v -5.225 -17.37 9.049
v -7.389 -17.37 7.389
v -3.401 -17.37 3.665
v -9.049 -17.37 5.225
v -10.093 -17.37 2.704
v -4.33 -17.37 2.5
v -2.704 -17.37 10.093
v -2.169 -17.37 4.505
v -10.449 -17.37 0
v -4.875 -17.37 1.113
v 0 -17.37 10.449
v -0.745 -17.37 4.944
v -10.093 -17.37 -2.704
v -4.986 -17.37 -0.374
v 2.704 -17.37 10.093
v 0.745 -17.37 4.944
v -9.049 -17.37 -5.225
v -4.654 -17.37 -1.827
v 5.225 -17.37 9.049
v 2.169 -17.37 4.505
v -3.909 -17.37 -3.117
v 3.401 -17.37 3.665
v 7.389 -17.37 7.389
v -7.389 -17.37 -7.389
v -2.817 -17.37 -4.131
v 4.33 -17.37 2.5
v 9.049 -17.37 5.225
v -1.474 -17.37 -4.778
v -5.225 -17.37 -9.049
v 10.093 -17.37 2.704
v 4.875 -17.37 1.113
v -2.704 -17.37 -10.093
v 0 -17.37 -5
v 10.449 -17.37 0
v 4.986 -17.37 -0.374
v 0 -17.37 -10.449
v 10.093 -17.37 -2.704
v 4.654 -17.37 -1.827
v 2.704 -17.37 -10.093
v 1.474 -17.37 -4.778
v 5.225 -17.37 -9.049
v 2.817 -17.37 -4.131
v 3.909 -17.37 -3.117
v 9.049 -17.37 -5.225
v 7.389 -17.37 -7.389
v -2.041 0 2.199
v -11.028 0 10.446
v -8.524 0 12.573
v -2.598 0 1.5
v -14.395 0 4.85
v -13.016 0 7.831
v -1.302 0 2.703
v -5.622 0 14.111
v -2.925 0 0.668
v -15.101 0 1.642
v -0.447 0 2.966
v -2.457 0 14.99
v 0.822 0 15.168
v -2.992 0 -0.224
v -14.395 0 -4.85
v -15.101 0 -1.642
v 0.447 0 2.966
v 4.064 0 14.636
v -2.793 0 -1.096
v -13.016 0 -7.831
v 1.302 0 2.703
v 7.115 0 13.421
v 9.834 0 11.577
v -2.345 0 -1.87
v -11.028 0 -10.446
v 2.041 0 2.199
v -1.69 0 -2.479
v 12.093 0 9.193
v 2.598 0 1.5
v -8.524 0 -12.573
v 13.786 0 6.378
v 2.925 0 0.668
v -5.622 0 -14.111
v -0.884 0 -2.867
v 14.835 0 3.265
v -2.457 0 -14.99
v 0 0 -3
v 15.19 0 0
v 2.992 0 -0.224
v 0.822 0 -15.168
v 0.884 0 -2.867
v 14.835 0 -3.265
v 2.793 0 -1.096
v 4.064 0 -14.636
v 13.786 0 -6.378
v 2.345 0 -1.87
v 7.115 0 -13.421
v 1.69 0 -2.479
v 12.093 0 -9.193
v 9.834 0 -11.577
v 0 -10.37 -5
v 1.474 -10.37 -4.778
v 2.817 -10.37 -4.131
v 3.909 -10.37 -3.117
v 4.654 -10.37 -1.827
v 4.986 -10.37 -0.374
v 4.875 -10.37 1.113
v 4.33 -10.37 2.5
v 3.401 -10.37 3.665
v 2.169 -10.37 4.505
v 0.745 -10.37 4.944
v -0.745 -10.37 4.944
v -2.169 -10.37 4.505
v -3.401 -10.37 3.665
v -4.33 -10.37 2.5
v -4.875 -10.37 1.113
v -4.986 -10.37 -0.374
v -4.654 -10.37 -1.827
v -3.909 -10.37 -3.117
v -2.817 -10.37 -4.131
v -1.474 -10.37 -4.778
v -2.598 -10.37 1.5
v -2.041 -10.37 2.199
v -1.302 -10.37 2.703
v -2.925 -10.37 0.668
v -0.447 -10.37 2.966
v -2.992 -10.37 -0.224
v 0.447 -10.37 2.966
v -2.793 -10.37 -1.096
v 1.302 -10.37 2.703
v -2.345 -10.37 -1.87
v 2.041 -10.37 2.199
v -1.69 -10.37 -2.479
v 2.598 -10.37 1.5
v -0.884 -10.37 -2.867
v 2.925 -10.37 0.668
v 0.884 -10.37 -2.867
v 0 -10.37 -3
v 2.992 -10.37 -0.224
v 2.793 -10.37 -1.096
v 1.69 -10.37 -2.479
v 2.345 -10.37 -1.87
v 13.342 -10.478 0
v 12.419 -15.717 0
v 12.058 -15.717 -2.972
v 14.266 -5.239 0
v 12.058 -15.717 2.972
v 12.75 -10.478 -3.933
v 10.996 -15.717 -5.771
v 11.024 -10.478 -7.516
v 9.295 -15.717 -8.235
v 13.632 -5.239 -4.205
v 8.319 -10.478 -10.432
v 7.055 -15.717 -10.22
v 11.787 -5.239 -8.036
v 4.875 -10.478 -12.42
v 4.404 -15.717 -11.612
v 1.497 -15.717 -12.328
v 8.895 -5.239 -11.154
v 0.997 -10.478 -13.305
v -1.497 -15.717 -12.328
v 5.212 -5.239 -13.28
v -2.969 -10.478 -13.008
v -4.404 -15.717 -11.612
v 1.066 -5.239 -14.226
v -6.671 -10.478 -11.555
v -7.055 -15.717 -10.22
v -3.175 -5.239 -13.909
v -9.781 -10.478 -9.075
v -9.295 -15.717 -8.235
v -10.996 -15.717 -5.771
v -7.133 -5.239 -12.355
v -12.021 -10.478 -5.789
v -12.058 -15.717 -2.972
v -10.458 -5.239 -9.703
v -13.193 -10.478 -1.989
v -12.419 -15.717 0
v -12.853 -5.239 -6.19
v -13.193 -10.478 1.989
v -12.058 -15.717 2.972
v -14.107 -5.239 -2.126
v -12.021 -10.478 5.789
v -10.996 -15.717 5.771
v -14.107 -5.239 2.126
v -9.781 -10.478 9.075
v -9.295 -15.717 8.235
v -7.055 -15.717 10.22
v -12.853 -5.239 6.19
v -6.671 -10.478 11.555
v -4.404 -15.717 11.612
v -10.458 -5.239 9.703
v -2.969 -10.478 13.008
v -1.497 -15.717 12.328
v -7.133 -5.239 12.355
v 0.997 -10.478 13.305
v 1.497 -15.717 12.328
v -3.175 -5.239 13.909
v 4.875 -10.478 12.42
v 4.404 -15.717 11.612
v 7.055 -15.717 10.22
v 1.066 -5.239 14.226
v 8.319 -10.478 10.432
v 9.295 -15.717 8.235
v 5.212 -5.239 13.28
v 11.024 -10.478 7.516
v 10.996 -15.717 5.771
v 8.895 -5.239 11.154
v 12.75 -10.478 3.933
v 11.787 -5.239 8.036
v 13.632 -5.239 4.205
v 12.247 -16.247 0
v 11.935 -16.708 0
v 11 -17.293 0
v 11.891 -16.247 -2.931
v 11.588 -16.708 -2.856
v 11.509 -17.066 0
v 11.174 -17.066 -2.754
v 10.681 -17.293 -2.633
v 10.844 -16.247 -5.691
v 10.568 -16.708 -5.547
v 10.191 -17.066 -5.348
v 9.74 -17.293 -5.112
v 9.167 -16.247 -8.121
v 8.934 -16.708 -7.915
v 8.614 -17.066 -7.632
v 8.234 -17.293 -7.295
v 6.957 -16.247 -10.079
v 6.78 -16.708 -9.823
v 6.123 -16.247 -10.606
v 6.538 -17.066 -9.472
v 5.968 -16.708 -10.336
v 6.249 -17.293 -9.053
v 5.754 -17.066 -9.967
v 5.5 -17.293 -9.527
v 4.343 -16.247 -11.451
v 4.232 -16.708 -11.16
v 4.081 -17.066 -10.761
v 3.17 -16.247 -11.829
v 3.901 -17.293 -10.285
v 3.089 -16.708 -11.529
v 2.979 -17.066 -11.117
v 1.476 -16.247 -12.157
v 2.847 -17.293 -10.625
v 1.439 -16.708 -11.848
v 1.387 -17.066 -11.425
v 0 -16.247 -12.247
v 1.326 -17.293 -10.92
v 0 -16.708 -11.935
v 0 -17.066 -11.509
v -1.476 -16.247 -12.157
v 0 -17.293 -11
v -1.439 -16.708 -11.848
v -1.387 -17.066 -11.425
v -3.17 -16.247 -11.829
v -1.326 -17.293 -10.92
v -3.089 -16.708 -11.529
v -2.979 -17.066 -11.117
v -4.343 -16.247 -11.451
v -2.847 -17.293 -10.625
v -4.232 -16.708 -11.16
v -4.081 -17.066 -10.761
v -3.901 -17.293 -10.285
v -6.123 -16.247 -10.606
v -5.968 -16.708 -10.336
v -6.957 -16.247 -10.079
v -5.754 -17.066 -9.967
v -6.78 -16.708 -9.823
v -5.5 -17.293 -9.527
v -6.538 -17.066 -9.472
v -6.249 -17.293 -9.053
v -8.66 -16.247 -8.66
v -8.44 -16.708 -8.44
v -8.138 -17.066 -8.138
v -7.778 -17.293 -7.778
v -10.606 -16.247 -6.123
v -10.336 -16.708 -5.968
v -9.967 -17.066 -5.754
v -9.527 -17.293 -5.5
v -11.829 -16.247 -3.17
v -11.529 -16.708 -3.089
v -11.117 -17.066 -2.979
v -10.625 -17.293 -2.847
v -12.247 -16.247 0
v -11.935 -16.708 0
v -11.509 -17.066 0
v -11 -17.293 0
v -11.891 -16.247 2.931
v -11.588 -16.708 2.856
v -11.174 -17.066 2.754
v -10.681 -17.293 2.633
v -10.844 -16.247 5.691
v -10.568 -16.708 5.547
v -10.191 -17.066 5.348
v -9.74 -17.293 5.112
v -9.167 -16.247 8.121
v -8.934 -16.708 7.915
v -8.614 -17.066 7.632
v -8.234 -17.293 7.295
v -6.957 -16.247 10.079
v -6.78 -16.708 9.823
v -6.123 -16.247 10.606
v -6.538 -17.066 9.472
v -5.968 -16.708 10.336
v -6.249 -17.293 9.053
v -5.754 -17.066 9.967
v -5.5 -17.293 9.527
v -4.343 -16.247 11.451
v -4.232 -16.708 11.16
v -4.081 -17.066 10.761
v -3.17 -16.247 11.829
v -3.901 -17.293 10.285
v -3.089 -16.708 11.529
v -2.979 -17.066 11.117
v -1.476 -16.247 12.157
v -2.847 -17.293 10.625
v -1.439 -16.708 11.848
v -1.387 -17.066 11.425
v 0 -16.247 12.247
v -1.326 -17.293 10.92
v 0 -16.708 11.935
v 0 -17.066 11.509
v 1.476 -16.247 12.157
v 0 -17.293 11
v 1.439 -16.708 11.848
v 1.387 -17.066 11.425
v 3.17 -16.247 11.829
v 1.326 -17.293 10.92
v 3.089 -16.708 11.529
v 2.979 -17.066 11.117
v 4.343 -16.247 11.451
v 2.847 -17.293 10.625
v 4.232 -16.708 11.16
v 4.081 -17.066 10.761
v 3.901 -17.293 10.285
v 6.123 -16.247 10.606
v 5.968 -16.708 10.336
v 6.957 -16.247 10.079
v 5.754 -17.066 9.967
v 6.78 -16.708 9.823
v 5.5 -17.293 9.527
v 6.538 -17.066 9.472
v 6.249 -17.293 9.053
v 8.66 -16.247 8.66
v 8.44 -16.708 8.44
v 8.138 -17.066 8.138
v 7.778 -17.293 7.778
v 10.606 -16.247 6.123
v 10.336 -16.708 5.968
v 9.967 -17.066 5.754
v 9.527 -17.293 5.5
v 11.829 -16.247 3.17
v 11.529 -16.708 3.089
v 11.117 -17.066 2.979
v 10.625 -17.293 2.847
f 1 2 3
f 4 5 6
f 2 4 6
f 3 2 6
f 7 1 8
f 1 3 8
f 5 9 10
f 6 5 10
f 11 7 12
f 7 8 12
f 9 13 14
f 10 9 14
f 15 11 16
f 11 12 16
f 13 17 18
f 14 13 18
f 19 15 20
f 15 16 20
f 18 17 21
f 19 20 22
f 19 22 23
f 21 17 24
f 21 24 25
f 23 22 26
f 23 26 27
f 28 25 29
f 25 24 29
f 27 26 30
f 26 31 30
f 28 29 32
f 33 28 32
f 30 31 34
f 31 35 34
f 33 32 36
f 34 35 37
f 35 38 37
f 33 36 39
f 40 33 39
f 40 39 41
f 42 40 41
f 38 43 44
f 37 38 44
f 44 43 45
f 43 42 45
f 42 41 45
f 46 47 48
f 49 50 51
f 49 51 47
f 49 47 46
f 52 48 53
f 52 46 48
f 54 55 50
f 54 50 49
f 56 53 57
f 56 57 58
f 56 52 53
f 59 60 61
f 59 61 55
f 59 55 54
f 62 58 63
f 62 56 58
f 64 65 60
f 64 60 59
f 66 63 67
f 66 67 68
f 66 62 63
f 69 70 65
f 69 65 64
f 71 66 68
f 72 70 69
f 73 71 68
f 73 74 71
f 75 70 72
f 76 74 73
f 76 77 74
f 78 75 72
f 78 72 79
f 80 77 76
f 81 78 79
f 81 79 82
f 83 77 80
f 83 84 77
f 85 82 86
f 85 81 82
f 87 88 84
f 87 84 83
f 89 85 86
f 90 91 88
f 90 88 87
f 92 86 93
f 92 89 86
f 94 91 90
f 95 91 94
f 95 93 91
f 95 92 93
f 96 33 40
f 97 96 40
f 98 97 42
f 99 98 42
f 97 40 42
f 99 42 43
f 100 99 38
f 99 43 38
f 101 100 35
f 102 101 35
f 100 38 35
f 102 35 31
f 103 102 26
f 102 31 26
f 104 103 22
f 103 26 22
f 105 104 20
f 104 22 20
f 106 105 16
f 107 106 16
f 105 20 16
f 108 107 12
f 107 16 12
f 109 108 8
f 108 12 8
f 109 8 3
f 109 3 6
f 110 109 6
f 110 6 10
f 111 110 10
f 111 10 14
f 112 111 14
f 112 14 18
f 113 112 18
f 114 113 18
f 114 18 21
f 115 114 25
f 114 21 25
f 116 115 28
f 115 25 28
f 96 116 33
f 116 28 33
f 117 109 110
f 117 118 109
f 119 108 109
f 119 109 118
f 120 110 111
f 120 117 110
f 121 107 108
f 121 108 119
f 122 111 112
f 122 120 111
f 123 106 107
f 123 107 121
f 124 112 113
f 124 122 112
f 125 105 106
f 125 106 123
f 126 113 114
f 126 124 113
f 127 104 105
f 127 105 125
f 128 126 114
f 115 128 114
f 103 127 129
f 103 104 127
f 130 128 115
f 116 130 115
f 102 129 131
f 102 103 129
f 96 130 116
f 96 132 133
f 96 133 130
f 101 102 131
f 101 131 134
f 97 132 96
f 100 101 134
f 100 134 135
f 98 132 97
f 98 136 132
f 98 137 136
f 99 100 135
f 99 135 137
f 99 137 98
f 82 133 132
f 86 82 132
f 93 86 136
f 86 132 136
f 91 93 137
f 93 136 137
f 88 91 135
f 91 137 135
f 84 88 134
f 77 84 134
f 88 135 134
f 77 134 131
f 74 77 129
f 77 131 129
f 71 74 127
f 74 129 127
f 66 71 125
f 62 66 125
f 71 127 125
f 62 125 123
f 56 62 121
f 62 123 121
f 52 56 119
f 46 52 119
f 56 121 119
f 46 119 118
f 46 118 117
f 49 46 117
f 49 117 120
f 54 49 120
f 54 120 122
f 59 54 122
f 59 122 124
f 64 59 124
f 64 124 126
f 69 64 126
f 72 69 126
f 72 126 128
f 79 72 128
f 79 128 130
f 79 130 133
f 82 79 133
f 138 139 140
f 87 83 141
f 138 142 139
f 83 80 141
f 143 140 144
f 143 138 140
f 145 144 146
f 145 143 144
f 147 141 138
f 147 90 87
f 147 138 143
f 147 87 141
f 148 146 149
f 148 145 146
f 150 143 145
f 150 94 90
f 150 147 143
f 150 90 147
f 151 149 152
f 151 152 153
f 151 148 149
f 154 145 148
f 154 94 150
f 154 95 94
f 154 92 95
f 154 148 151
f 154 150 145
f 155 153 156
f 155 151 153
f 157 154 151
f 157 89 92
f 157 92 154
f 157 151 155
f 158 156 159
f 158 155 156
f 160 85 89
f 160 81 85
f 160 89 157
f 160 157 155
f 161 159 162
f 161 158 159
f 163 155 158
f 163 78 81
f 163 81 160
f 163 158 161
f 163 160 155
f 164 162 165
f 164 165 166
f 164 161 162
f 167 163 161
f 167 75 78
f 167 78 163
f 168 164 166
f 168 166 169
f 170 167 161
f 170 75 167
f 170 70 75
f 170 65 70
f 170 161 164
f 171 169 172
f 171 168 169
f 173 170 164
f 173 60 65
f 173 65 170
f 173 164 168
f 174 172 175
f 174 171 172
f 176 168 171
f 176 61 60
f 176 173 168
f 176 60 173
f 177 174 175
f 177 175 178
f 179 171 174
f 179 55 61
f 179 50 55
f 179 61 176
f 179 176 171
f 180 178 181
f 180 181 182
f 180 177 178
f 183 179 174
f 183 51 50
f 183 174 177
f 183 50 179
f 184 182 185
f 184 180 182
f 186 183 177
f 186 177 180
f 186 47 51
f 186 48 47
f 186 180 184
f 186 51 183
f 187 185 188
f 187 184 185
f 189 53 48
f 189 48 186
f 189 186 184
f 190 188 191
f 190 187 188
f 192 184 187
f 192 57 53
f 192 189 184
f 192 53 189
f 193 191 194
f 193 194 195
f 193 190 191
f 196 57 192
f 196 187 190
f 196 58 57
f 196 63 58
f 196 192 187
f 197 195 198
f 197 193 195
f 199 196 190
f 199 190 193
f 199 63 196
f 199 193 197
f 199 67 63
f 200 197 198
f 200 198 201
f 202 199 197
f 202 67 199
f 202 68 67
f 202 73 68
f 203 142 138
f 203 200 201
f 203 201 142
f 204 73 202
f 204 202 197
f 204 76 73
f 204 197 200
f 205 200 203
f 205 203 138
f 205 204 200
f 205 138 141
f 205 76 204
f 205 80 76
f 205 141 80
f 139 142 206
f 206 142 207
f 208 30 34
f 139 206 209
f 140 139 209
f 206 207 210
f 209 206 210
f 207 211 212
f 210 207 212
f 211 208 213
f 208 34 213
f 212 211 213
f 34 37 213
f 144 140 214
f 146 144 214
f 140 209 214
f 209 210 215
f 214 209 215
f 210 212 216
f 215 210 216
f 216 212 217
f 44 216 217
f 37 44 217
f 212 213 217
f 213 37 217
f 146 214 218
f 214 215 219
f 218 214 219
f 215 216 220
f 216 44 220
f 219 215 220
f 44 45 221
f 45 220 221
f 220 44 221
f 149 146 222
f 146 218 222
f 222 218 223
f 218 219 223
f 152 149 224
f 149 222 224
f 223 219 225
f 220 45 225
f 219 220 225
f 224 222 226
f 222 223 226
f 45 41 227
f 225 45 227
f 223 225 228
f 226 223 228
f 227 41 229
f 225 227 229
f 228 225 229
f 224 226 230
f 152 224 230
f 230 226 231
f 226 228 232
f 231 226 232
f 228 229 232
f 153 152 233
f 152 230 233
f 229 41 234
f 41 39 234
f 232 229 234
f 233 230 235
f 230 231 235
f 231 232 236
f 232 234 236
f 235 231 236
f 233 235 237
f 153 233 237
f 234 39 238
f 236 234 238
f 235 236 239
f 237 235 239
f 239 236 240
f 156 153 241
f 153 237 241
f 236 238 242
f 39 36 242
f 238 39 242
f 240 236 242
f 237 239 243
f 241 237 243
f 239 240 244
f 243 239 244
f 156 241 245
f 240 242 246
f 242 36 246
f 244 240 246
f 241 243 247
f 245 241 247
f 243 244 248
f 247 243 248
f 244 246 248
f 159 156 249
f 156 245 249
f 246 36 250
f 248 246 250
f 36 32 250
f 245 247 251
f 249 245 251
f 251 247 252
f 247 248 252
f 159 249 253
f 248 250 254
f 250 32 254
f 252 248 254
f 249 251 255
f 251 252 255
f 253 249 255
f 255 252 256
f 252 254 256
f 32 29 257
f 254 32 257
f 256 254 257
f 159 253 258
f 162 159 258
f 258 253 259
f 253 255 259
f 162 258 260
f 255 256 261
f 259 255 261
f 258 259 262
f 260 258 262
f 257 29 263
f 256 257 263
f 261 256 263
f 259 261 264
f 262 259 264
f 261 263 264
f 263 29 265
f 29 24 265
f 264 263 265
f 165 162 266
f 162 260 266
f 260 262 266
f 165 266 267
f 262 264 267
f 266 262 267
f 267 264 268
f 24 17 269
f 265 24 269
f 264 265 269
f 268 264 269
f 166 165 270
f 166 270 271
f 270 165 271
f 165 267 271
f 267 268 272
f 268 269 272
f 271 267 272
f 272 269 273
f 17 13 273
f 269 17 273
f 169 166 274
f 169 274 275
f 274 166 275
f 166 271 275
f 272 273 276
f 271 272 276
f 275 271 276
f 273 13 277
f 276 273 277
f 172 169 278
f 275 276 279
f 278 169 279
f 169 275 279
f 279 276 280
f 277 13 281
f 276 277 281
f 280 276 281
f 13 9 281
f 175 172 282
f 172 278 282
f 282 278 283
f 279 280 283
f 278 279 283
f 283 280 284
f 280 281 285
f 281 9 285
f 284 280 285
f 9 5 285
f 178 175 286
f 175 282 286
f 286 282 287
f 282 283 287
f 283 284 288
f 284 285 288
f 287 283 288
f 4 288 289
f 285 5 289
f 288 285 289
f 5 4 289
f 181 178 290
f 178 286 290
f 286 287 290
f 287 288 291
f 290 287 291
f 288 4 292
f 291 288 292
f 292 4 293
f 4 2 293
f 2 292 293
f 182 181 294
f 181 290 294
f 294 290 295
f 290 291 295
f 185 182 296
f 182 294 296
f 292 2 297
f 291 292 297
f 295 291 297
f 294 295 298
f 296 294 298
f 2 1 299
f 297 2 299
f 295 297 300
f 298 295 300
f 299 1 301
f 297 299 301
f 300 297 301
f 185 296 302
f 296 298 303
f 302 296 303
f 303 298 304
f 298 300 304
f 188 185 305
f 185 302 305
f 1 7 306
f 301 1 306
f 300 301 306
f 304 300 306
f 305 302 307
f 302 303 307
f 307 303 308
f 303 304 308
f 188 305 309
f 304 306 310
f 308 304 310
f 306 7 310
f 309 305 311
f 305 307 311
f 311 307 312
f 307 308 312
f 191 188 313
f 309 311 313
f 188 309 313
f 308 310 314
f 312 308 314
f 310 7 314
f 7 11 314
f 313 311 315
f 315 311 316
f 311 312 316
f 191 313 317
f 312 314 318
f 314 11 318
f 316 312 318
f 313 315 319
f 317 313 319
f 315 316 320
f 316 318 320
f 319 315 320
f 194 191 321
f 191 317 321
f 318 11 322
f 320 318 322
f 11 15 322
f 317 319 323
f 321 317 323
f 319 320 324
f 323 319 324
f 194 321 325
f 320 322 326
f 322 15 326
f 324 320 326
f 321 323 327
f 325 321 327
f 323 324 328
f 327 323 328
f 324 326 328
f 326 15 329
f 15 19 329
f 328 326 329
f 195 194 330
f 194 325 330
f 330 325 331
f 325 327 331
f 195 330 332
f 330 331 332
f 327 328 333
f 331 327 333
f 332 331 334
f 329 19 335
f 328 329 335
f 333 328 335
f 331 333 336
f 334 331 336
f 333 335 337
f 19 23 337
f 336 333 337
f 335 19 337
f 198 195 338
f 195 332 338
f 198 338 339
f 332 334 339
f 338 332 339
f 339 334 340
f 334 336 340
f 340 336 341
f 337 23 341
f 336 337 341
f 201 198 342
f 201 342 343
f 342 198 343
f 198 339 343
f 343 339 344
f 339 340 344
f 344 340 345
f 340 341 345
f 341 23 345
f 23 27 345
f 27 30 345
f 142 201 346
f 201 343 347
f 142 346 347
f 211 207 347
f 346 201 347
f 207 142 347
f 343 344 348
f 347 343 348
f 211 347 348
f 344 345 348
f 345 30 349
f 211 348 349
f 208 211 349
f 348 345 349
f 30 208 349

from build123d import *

# Parameters (mm, degrees)
ESBO_O1_R                = 15.19
RESSALTO_EXTRUS_O1_DEPTH = 17.37
RESSALTO_EXTRUS_O1_DRAFT = -10
ESBO_O2_R                = 5
CORTE_EXTRUS_O1_DEPTH    = 7
ESBO_O3_R                = 3
CORTE_EXTRUS_O2_DEPTH    = 24.853911629
FILETE1_R                = 2


with BuildPart() as part:
    # Esboço1 → Ressalto-extrusão1 (with draft: the straight prism first)
    with BuildSketch(Plane(origin=(0, 0, 0), x_dir=(1, 0, 0), z_dir=(0, 1, 0))):
        Circle(ESBO_O1_R)
    extrude(amount=-RESSALTO_EXTRUS_O1_DEPTH)
    # Ressalto-extrusão1: the draft: its side faces are tilted about the plane it starts from
    ressalto_extrus_o1_sides = [part.faces().sort_by_distance(p)[0] for p in [
        (-15.19, -8.685, 0),
    ]]
    draft(ressalto_extrus_o1_sides, Plane(origin=(0, 0, 0), x_dir=(1, 0, 0), z_dir=(0, 1, 0)), RESSALTO_EXTRUS_O1_DRAFT)

    # Esboço2 → Corte-extrusão1 (cut)
    with BuildSketch(Plane.XZ.offset(17.37)):
        with Locations(Location((0, 0, 0), (0, 0, 270))):
            Circle(ESBO_O2_R)
    extrude(amount=-CORTE_EXTRUS_O1_DEPTH, mode=Mode.SUBTRACT)

    # Esboço3 → Corte-extrusão2 (cut, through all)
    with BuildSketch(Plane.XZ.offset(10.37)):
        with Locations(Location((0, 0, 0), (0, 0, 270))):
            Circle(ESBO_O3_R)
    extrude(amount=-CORTE_EXTRUS_O2_DEPTH, mode=Mode.SUBTRACT)

    # Filete1
    filete1_edges = [part.edges().sort_by_distance(p)[0] for p in [
        (-12.127200345, -17.37, 0),
    ]]
    fillet(filete1_edges, radius=FILETE1_R)


solid = part.part
